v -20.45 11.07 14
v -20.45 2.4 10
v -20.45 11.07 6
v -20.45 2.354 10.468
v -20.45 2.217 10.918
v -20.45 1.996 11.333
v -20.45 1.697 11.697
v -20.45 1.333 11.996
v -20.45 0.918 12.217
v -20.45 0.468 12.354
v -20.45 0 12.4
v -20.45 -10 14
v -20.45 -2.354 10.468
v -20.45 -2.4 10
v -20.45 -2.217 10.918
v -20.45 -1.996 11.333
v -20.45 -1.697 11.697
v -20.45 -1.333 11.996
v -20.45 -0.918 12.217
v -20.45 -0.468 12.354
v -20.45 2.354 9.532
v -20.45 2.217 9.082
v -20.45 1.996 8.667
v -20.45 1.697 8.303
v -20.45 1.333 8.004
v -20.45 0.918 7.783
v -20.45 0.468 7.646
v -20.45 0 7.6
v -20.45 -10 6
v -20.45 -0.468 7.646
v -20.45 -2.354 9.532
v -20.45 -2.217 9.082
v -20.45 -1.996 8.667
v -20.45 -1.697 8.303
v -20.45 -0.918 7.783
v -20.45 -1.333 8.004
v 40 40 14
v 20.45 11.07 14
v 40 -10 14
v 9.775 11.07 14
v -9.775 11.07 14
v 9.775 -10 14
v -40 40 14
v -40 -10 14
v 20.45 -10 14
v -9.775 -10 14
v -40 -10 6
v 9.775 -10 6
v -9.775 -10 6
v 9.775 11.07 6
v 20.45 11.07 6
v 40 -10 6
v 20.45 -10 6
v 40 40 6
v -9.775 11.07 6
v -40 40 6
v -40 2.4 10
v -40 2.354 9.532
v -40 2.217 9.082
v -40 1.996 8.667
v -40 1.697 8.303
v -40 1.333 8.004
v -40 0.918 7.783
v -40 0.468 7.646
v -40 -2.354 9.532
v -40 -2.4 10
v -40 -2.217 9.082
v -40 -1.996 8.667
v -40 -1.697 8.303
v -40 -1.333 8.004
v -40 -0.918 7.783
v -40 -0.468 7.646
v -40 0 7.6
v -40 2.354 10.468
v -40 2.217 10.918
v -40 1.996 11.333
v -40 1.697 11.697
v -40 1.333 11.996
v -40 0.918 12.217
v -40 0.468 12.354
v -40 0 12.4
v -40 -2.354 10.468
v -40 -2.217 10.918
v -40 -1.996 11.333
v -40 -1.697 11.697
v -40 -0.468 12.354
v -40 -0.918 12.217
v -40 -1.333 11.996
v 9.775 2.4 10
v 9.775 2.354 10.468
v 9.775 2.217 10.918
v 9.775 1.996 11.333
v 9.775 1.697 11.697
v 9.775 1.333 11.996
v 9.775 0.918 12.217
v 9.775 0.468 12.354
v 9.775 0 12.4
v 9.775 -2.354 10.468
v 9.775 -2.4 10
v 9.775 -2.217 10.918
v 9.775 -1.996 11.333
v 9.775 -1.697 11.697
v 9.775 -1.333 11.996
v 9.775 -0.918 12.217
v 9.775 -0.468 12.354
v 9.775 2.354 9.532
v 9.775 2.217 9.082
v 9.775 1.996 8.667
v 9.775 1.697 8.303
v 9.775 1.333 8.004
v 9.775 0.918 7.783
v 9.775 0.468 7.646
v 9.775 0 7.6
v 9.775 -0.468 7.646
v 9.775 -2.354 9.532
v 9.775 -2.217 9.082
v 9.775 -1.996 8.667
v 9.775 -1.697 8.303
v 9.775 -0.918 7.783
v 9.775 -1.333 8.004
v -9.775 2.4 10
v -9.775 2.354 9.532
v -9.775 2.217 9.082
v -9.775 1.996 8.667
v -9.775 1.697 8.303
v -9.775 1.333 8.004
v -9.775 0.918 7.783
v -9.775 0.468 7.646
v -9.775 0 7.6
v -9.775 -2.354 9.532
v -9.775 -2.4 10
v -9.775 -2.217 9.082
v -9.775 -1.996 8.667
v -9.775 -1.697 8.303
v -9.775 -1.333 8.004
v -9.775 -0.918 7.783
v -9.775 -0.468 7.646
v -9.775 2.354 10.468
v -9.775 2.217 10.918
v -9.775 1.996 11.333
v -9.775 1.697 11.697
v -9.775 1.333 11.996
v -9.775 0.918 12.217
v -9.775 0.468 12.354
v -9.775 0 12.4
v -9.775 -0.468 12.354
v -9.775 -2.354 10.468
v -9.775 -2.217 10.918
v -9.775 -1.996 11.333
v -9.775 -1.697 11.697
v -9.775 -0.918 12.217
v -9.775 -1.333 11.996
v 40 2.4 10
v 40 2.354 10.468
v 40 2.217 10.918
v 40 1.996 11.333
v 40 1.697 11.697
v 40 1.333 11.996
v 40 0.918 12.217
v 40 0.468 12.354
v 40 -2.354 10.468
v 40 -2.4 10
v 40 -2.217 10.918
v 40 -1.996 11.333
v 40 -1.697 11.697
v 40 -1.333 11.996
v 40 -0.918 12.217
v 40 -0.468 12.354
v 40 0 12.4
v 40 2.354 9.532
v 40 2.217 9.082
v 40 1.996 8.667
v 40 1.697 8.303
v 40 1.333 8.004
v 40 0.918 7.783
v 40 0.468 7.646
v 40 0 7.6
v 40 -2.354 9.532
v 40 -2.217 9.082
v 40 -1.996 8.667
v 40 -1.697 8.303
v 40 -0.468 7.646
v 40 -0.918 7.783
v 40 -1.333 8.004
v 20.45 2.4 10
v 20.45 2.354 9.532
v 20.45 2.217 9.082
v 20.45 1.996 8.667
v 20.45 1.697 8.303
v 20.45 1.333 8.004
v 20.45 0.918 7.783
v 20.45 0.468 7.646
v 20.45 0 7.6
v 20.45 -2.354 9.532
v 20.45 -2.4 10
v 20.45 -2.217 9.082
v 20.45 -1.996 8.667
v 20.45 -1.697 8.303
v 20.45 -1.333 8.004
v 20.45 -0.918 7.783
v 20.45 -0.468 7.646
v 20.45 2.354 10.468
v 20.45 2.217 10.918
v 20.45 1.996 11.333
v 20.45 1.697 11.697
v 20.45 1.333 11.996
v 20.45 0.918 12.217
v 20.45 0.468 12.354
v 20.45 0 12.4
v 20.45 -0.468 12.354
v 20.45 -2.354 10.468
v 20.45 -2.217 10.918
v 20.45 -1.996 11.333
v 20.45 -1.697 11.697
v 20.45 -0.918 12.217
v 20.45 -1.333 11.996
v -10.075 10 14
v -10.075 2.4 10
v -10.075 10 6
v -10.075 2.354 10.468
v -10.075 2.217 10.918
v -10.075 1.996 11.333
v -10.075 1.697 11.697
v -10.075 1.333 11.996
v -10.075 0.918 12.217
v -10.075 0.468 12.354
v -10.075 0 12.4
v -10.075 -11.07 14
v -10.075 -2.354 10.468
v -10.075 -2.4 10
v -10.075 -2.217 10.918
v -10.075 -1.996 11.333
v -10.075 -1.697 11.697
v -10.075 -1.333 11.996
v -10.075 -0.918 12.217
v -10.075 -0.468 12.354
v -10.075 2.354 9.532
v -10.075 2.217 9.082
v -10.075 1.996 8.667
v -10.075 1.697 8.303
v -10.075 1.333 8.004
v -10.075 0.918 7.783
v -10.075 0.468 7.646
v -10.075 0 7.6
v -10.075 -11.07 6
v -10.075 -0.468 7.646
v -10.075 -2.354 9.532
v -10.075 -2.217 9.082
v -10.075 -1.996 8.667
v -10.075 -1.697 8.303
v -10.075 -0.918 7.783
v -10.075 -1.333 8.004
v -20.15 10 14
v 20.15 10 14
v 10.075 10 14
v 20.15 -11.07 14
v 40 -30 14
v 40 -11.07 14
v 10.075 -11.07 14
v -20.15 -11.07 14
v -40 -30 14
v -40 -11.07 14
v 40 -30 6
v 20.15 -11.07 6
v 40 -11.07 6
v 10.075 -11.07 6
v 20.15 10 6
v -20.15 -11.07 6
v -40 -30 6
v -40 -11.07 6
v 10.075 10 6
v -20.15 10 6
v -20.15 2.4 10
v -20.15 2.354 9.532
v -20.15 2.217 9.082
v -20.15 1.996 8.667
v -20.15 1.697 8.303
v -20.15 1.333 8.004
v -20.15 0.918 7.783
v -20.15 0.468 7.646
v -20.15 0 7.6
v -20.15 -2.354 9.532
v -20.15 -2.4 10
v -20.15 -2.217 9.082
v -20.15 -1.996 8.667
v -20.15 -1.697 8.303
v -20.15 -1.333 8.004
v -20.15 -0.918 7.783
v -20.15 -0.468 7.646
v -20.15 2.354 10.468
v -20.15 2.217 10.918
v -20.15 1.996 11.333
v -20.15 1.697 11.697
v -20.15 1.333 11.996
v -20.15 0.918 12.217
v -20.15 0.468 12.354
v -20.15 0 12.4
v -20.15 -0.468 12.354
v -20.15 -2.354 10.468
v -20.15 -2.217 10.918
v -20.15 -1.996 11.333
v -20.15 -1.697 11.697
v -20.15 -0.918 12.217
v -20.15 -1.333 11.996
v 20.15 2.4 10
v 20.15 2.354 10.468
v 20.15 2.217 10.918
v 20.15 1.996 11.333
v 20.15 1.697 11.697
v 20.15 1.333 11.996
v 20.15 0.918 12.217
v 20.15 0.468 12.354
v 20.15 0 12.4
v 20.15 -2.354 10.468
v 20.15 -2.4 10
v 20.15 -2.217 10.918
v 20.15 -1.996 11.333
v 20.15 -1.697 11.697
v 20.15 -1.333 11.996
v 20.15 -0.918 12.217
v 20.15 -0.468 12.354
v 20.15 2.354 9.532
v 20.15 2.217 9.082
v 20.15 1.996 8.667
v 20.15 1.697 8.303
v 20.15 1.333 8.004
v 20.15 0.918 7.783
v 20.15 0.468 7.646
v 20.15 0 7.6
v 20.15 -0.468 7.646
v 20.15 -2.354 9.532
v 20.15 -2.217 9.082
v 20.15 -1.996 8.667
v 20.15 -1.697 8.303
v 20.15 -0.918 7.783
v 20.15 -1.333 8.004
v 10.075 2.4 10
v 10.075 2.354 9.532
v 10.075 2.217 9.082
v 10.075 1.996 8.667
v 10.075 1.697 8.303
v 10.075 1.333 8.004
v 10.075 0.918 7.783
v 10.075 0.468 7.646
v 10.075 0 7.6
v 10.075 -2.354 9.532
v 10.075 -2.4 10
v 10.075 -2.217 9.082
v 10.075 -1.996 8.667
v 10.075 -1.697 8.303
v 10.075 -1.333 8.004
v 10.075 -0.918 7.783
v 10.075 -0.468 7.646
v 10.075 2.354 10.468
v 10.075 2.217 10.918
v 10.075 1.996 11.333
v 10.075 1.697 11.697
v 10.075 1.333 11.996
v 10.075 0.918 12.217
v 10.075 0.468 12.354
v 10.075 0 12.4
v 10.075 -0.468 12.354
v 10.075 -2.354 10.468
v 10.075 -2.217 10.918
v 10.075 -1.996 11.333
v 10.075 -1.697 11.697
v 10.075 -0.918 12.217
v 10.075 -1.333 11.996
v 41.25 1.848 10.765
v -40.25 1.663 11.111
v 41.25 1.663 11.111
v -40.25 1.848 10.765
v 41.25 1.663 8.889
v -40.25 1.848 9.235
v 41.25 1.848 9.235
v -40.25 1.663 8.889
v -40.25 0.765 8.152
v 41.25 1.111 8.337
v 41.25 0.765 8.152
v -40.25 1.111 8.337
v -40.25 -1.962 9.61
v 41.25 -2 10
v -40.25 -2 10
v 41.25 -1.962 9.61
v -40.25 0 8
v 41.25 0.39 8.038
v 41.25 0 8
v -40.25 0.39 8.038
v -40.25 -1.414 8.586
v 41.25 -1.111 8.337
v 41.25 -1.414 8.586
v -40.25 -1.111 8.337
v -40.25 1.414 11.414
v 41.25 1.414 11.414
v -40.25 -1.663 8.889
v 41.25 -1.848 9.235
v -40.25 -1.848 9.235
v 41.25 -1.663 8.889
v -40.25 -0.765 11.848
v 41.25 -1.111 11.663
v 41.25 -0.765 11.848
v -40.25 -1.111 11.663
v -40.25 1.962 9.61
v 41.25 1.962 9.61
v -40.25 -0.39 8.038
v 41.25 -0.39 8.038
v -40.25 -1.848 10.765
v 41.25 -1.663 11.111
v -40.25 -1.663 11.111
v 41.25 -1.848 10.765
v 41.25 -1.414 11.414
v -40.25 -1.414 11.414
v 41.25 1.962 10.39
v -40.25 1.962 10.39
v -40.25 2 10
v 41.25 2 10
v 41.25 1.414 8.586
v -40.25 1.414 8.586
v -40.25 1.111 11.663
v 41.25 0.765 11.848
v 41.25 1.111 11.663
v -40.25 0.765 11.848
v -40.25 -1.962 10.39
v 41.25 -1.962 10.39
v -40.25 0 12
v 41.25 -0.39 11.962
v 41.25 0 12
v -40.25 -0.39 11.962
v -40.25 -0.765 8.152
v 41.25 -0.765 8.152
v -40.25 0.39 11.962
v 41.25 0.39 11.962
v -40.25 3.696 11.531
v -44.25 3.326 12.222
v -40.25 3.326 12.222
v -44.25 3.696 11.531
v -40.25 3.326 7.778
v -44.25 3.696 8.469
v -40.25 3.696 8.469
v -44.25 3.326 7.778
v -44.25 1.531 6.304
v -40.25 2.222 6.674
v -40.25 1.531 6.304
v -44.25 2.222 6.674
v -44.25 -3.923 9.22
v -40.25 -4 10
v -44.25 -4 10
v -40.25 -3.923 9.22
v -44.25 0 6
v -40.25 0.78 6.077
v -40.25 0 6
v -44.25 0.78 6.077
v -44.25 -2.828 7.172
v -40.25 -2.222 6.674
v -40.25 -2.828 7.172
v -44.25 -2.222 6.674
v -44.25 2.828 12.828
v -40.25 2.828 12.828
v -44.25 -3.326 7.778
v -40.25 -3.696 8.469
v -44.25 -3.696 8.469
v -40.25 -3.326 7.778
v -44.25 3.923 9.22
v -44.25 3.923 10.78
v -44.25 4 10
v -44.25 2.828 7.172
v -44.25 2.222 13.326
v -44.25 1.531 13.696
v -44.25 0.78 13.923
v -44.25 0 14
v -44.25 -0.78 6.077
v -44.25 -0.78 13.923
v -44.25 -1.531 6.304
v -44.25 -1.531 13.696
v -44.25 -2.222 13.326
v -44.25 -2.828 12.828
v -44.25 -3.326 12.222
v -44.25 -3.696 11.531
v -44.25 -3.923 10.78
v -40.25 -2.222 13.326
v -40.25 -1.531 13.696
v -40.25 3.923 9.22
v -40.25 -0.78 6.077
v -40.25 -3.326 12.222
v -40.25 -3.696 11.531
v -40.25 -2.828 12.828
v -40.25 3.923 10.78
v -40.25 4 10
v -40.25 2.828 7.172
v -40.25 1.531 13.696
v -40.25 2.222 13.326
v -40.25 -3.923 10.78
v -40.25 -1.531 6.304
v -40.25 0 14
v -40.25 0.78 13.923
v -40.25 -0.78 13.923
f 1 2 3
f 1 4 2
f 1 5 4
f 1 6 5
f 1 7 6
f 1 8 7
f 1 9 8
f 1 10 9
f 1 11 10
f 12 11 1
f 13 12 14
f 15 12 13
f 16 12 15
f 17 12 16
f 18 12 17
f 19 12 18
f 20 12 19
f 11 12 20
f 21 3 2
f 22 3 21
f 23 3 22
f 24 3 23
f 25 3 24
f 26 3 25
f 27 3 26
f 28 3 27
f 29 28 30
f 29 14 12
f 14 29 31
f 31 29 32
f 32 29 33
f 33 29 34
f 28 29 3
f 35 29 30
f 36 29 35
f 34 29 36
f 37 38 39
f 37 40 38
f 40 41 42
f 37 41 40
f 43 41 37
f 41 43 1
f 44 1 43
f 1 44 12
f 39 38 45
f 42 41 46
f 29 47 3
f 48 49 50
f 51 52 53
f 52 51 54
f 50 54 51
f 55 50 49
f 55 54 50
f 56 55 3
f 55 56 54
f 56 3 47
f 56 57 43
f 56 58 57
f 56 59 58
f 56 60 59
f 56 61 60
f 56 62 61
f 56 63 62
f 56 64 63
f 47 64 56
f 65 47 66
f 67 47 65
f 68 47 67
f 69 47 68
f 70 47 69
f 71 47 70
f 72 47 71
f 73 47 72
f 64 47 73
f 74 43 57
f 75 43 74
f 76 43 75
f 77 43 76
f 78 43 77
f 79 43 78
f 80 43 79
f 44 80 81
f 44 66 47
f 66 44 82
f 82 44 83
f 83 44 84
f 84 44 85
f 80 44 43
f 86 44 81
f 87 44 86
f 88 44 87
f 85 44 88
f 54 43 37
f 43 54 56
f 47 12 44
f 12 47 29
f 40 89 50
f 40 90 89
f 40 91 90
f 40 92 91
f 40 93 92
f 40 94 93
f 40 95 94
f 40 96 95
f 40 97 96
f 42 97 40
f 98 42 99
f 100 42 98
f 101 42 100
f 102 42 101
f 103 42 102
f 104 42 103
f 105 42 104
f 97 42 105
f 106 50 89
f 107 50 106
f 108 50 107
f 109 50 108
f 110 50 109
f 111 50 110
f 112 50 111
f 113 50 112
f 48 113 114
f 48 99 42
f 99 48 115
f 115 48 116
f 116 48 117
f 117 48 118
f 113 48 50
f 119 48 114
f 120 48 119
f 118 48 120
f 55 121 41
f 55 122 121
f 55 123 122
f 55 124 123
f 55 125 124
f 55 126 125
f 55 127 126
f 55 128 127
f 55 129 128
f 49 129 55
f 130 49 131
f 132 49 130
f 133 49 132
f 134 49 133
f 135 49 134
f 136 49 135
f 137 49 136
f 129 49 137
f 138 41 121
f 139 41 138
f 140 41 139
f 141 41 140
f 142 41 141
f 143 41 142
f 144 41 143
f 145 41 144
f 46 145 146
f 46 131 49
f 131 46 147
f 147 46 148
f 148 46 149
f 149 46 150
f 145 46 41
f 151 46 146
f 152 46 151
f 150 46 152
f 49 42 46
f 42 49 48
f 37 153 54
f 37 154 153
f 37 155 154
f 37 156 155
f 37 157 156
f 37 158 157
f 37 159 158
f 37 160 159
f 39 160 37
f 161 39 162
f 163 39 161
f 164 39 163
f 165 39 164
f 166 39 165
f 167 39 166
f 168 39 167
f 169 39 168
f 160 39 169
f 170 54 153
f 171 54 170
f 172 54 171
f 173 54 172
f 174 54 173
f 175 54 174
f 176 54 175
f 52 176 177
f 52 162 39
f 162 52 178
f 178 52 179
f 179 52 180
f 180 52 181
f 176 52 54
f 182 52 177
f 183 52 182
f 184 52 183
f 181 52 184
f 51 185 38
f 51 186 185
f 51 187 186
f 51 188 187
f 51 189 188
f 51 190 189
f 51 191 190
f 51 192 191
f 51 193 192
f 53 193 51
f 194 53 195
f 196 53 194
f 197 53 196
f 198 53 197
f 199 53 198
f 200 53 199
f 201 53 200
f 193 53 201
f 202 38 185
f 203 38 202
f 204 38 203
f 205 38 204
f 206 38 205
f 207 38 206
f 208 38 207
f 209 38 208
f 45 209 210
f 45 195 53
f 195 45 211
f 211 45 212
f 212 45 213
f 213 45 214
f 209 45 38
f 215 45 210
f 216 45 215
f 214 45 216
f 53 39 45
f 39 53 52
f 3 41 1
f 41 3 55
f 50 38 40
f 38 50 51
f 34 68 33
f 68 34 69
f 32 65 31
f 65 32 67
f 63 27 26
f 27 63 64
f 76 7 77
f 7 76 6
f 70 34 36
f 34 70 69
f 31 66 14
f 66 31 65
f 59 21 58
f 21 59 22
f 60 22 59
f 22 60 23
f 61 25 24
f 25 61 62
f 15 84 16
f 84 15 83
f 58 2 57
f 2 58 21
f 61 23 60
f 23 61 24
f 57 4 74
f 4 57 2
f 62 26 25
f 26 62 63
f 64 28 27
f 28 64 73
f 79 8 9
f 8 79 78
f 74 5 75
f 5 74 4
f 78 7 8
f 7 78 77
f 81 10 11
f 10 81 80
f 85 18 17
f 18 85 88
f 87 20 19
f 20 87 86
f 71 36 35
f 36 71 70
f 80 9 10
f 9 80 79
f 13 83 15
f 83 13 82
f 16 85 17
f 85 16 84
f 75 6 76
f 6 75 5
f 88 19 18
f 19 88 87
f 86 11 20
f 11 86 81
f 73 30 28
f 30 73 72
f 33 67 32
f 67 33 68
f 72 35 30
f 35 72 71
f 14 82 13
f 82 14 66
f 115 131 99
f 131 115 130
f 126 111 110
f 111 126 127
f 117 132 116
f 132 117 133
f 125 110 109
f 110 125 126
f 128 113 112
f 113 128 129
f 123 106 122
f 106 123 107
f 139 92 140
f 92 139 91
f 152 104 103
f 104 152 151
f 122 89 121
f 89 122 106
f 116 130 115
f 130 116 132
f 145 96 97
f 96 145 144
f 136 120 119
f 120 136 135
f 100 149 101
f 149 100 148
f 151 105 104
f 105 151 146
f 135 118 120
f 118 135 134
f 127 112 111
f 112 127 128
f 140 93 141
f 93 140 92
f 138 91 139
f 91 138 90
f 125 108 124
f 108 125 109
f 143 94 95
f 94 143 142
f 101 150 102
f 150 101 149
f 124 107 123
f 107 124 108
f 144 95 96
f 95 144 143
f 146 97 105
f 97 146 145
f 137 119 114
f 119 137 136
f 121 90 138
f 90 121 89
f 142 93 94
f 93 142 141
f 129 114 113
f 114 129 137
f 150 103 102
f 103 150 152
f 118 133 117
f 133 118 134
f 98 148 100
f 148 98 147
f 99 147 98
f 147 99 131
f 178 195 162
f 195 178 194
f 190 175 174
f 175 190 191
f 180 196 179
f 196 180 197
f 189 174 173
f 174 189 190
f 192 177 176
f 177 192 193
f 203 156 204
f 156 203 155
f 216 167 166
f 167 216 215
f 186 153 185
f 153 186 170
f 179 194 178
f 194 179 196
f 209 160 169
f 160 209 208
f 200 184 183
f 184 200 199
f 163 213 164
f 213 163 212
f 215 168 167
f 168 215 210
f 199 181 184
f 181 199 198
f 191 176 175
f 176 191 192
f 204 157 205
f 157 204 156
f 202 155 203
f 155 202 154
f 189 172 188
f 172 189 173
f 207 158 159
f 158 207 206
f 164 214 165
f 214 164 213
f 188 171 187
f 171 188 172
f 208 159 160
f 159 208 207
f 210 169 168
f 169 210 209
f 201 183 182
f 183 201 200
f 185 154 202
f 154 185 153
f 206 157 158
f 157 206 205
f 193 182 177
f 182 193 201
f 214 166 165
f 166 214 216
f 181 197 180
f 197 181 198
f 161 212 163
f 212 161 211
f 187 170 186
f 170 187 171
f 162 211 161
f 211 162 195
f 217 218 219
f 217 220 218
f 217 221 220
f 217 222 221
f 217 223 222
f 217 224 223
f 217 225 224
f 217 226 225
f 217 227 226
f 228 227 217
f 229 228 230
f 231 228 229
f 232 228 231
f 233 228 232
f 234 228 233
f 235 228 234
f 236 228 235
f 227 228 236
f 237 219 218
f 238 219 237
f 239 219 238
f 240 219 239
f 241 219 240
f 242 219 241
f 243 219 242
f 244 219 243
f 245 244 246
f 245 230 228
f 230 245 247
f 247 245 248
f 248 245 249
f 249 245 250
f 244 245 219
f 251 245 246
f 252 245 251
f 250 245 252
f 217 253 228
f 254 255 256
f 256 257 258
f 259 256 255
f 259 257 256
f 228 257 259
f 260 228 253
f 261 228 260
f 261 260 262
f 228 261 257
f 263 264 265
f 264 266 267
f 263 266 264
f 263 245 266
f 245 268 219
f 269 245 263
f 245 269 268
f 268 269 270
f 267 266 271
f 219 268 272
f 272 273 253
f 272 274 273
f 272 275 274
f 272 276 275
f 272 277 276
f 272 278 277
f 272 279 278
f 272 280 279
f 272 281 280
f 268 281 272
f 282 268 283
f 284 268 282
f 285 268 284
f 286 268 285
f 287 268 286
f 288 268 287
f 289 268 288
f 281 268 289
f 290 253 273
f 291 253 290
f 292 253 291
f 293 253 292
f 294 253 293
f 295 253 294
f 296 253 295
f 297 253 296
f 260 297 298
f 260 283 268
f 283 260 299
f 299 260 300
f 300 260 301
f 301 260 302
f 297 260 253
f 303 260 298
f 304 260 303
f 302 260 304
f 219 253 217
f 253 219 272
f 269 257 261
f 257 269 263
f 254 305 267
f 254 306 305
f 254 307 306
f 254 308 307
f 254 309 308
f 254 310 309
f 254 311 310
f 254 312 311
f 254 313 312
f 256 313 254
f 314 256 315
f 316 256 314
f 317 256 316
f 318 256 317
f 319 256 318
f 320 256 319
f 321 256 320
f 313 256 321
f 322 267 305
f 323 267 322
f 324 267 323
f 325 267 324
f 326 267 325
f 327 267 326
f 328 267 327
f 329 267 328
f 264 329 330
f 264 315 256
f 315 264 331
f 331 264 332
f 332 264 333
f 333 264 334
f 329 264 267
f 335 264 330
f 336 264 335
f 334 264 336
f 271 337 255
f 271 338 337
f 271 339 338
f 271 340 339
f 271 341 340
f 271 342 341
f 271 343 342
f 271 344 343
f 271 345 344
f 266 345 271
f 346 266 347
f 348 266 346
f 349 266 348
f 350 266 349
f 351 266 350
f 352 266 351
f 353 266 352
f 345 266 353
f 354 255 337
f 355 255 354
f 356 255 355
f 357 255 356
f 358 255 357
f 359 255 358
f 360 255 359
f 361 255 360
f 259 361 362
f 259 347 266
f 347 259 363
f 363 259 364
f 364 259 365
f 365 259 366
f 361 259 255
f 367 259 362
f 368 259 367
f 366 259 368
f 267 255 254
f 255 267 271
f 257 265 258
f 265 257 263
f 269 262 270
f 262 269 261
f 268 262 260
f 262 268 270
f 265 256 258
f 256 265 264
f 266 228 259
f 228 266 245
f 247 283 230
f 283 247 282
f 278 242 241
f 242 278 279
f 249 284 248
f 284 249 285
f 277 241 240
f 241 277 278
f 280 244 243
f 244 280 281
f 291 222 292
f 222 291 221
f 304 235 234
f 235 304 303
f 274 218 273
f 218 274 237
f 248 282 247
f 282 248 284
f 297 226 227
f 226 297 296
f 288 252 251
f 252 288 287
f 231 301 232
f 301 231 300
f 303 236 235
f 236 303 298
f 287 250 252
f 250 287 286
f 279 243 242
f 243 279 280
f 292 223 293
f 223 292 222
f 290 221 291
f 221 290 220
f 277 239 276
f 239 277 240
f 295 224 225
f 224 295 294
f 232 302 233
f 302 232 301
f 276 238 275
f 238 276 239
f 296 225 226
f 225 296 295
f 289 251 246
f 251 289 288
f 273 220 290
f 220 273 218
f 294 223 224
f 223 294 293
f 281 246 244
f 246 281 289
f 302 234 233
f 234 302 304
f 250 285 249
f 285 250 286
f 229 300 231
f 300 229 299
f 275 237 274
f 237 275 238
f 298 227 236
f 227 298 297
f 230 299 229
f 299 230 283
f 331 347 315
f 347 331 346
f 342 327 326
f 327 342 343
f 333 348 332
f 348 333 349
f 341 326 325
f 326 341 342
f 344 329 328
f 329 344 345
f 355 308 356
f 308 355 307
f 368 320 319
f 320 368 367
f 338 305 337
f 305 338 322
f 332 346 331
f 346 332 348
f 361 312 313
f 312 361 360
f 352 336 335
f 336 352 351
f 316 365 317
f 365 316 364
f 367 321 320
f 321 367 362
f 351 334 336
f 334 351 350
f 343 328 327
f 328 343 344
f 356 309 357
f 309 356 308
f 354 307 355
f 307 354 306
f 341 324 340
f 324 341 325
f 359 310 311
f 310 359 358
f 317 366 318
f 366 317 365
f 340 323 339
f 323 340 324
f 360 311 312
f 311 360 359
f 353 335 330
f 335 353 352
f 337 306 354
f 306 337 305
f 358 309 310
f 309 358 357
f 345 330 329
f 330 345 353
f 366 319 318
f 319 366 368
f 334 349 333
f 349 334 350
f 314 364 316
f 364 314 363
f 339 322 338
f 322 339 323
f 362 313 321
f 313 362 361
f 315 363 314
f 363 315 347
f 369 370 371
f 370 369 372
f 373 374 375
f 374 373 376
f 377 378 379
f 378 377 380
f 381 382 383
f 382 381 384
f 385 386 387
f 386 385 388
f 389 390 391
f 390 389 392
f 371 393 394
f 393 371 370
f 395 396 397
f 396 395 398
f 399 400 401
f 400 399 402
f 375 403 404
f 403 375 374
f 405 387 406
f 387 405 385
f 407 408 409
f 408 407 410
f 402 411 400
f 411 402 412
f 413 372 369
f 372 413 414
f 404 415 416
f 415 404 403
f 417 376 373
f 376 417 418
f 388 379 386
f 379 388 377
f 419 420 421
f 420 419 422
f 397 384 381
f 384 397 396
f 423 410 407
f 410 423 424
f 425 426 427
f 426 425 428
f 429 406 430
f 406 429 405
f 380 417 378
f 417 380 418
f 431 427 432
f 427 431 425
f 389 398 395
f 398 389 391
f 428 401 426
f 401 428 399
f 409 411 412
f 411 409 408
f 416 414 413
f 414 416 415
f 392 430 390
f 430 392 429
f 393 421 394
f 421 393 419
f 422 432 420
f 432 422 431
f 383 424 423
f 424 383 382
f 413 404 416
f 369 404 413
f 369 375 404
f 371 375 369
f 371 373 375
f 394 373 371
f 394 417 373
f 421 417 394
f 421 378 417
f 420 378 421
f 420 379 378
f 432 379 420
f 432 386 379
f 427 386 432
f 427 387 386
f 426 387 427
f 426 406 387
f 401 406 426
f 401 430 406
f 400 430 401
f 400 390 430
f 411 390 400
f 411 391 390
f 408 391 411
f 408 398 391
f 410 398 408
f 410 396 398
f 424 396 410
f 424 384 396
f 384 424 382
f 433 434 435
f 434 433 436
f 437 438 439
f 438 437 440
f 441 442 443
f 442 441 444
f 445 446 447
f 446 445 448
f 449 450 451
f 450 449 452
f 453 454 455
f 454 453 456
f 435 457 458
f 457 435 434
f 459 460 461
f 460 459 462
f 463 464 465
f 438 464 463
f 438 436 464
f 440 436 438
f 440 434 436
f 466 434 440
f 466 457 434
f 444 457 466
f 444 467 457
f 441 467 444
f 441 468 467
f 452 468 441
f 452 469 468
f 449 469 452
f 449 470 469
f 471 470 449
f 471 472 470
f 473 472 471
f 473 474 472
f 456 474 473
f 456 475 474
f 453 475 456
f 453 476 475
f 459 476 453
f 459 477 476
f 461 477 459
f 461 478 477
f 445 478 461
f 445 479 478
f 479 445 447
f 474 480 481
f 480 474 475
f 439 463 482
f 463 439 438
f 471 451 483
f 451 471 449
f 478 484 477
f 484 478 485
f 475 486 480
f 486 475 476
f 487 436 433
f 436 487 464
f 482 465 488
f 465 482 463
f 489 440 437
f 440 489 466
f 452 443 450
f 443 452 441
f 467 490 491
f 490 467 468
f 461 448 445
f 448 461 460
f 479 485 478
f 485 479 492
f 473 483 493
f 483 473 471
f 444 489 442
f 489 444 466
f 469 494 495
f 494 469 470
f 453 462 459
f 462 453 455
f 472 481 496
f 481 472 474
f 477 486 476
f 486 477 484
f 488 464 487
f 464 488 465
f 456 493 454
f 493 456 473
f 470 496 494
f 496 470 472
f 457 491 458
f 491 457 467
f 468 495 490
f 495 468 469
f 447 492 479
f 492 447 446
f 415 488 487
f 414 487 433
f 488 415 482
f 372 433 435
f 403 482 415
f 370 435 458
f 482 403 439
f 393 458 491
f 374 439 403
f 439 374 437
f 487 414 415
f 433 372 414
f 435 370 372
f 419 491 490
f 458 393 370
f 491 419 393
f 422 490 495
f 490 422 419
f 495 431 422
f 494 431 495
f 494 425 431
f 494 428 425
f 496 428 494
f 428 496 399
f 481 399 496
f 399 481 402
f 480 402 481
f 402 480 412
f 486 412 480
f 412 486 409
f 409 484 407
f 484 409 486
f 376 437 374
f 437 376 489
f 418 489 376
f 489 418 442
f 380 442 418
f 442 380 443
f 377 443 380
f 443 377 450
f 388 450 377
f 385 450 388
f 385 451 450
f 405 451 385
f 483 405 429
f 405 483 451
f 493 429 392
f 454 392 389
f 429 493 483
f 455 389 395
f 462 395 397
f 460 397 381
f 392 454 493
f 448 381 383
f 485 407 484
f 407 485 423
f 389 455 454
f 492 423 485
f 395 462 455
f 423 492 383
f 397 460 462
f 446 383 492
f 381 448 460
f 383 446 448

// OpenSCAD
$fn = 32;

// ------------------------------------------------------------------------
// Butt hinge: hinge 80 mm, leaf swung 0 deg
// Every part is its own module, assembly() places every instance.
// ------------------------------------------------------------------------

// --- part 1 ---
module hinge_base() {
  difference() {
    union() {
      translate([-40, -10, -4]) cube([19.55, 50, 8]);
      translate([-9.775, -10, -4]) cube([19.55, 50, 8]);
      translate([20.45, -10, -4]) cube([19.55, 50, 8]);
      translate([-40, 11.07, -4]) cube([80, 28.93, 8]);
    }
    translate([-30.225, 0, 0]) rotate([0, 90, 0]) cylinder(h = 21.55, d = 4.8, center = true);
    translate([0, 0, 0]) rotate([0, 90, 0]) cylinder(h = 21.55, d = 4.8, center = true);
    translate([30.225, 0, 0]) rotate([0, 90, 0]) cylinder(h = 21.55, d = 4.8, center = true);
  }
}

// --- part 2 ---
module hinge_mover() {
  difference() {
    union() {
      translate([-20.15, -30, -4]) cube([10.075, 40, 8]);
      translate([10.075, -30, -4]) cube([10.075, 40, 8]);
      translate([-40, -30, -4]) cube([80, 18.93, 8]);
    }
    translate([-15.113, 0, 0]) rotate([0, 90, 0]) cylinder(h = 12.075, d = 4.8, center = true);
    translate([15.113, 0, 0]) rotate([0, 90, 0]) cylinder(h = 12.075, d = 4.8, center = true);
  }
}

// --- part 3 ---
module hinge_pin() {
  rotate([0, 90, 0]) cylinder(h = 82.5, d = 4, center = true);
  translate([-44.25, 0, 0]) rotate([0, 90, 0]) cylinder(h = 4, d = 8);
}

// --- assembly ---
module assembly() {
  color([0.80, 0.24, 0.20]) translate([0, 0, 10]) rotate([0, 0, 0]) hinge_base();
  color([0.20, 0.45, 0.75]) translate([0, 0, 10]) rotate([0, 0, 0]) hinge_mover();
  color([0.25, 0.62, 0.32]) translate([0, 0, 10]) rotate([0, 0, 0]) hinge_pin();
}

assembly();
